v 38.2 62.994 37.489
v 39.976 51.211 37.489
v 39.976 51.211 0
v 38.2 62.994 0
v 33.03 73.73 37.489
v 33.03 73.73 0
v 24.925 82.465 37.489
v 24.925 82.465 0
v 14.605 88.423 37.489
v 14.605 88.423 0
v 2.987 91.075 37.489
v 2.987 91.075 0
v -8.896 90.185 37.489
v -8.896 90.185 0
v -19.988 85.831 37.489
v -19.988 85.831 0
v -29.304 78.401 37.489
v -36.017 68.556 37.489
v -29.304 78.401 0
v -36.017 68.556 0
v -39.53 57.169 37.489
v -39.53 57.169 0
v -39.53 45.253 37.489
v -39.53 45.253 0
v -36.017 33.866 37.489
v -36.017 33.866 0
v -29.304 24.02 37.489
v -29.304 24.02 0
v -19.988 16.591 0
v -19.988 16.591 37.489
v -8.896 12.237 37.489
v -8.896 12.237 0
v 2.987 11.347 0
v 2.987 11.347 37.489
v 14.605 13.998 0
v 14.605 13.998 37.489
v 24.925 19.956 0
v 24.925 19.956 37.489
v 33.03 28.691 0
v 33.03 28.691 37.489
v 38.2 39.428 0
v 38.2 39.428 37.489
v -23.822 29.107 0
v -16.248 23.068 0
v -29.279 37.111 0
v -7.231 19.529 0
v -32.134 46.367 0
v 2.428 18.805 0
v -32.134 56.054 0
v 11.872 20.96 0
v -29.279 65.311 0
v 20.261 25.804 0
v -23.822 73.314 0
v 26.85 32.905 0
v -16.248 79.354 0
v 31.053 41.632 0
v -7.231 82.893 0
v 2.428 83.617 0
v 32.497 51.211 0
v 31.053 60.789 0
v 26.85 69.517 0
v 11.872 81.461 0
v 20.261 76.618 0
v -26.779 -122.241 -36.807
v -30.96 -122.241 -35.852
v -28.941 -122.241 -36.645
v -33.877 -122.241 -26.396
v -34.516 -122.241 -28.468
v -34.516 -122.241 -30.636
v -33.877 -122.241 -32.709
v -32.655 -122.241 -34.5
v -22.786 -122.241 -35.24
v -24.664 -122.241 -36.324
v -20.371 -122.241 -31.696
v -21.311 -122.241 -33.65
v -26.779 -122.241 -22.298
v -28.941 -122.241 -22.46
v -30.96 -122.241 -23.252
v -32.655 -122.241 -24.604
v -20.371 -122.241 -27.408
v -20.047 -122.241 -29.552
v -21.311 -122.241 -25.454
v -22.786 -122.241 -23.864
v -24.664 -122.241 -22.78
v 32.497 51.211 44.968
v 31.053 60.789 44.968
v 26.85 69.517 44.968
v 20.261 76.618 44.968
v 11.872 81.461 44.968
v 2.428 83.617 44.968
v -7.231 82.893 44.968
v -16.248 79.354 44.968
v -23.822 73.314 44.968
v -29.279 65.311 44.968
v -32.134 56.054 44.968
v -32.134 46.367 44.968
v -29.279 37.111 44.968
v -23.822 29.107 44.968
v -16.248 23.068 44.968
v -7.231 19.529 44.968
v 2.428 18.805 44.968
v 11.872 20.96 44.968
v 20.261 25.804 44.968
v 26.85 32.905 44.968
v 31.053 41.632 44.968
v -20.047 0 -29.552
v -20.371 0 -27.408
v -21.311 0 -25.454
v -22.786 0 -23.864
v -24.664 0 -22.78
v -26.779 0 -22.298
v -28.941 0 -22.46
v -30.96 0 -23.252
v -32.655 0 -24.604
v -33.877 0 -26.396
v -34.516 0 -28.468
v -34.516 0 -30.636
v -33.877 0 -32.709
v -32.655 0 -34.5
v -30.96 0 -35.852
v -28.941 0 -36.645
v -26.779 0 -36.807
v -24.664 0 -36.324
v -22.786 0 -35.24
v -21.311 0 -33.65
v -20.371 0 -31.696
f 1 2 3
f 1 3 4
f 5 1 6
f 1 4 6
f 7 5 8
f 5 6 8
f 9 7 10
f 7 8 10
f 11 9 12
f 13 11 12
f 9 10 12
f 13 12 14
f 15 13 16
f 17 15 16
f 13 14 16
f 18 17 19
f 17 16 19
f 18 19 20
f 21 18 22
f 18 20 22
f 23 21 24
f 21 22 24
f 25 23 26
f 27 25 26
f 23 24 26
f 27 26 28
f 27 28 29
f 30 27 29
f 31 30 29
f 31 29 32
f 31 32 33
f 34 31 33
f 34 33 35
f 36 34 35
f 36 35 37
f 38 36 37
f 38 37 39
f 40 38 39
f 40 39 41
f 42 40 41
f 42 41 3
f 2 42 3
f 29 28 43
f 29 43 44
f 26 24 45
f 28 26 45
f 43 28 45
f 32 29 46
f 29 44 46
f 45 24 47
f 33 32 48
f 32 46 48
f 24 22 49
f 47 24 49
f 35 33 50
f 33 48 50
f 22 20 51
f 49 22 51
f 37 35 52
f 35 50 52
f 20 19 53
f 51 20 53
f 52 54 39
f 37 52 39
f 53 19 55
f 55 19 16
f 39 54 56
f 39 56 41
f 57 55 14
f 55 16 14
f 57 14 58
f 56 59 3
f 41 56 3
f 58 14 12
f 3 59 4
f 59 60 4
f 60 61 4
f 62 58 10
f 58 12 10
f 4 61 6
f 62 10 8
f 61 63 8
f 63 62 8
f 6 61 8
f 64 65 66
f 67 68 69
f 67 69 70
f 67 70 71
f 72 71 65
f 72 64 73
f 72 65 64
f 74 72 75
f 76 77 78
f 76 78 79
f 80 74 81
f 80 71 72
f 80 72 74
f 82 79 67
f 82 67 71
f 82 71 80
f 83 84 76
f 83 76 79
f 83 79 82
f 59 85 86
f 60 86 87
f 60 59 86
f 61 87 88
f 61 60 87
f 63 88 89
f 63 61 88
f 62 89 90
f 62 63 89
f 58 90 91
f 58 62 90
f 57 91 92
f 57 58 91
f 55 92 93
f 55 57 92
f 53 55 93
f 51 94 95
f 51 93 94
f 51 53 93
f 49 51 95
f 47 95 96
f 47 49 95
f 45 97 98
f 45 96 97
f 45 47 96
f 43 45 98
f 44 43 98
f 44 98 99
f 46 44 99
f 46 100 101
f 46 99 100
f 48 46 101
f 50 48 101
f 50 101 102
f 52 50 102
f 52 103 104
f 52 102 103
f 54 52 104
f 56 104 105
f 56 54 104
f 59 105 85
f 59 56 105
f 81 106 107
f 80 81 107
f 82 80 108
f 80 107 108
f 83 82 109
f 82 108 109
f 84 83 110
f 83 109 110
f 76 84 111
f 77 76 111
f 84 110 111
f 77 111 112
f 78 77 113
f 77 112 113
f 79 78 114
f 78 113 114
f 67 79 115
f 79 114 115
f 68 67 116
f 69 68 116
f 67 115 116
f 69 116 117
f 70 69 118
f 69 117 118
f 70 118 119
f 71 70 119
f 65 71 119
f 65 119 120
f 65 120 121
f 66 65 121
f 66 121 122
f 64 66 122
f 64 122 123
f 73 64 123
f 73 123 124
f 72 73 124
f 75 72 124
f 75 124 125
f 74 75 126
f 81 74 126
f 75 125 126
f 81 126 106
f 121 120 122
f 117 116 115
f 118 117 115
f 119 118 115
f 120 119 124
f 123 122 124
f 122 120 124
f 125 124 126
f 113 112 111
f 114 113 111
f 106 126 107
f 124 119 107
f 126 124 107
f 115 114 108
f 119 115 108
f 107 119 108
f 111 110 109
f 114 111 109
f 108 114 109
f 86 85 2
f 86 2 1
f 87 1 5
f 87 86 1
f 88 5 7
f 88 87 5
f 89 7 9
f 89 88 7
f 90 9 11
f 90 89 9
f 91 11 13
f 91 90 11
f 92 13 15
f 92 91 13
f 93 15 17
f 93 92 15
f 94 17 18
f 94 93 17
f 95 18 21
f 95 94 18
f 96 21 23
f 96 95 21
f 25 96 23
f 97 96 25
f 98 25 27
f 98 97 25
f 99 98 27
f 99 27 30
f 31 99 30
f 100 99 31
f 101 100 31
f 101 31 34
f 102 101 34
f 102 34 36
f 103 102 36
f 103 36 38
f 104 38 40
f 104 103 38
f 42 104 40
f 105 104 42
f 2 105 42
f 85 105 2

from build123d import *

# Parameters (mm, degrees)
F0_R     = 39.9760214069
F0_R_2   = 32.4968914301
F1_DEPTH = 45.1091602445
F3_R     = 7.2748439962
F4_DEPTH = 122.2406476736


# Not quite as in the source:
# - a fillet or chamfer that OpenCascade refuses, or shapes differently, is made with other operations: its cross-section is extruded or revolved along the edge and cut away or added


with BuildPart() as f1:
    # F0 (on Top) → F1 (new body)
    with BuildSketch(Plane.XY):
        with Locations((0, 51.2107610703)):
            Circle(F0_R)
        with Locations((0, 51.2107610703)):
            Circle(F0_R_2, mode=Mode.SUBTRACT)
    extrude(amount=F1_DEPTH)

    # F2: chamfer of 7.62 on 1 edges, made by hand

    # F2_s1 → F2_t2 (revolve, cut)
    with BuildSketch(Plane.XZ.offset(-51.2107610703)):
        Polygon((39.9760214069, 37.4891602445), (32.3560214069, 45.1091602445), (39.9760214069, 45.1091602445), align=None)
    revolve(axis=Axis((0, 51.2107610703, 45.1091602445), (0, 0, 1)), mode=Mode.SUBTRACT)


with BuildPart() as f4:
    # F3 (on Front) → F4 (new body)
    with BuildSketch(Plane.XZ):
        with Locations((-27.3221582174, -29.5520946383)):
            Circle(F3_R)
    extrude(amount=F4_DEPTH)


solid = Compound([f1.part, f4.part])
